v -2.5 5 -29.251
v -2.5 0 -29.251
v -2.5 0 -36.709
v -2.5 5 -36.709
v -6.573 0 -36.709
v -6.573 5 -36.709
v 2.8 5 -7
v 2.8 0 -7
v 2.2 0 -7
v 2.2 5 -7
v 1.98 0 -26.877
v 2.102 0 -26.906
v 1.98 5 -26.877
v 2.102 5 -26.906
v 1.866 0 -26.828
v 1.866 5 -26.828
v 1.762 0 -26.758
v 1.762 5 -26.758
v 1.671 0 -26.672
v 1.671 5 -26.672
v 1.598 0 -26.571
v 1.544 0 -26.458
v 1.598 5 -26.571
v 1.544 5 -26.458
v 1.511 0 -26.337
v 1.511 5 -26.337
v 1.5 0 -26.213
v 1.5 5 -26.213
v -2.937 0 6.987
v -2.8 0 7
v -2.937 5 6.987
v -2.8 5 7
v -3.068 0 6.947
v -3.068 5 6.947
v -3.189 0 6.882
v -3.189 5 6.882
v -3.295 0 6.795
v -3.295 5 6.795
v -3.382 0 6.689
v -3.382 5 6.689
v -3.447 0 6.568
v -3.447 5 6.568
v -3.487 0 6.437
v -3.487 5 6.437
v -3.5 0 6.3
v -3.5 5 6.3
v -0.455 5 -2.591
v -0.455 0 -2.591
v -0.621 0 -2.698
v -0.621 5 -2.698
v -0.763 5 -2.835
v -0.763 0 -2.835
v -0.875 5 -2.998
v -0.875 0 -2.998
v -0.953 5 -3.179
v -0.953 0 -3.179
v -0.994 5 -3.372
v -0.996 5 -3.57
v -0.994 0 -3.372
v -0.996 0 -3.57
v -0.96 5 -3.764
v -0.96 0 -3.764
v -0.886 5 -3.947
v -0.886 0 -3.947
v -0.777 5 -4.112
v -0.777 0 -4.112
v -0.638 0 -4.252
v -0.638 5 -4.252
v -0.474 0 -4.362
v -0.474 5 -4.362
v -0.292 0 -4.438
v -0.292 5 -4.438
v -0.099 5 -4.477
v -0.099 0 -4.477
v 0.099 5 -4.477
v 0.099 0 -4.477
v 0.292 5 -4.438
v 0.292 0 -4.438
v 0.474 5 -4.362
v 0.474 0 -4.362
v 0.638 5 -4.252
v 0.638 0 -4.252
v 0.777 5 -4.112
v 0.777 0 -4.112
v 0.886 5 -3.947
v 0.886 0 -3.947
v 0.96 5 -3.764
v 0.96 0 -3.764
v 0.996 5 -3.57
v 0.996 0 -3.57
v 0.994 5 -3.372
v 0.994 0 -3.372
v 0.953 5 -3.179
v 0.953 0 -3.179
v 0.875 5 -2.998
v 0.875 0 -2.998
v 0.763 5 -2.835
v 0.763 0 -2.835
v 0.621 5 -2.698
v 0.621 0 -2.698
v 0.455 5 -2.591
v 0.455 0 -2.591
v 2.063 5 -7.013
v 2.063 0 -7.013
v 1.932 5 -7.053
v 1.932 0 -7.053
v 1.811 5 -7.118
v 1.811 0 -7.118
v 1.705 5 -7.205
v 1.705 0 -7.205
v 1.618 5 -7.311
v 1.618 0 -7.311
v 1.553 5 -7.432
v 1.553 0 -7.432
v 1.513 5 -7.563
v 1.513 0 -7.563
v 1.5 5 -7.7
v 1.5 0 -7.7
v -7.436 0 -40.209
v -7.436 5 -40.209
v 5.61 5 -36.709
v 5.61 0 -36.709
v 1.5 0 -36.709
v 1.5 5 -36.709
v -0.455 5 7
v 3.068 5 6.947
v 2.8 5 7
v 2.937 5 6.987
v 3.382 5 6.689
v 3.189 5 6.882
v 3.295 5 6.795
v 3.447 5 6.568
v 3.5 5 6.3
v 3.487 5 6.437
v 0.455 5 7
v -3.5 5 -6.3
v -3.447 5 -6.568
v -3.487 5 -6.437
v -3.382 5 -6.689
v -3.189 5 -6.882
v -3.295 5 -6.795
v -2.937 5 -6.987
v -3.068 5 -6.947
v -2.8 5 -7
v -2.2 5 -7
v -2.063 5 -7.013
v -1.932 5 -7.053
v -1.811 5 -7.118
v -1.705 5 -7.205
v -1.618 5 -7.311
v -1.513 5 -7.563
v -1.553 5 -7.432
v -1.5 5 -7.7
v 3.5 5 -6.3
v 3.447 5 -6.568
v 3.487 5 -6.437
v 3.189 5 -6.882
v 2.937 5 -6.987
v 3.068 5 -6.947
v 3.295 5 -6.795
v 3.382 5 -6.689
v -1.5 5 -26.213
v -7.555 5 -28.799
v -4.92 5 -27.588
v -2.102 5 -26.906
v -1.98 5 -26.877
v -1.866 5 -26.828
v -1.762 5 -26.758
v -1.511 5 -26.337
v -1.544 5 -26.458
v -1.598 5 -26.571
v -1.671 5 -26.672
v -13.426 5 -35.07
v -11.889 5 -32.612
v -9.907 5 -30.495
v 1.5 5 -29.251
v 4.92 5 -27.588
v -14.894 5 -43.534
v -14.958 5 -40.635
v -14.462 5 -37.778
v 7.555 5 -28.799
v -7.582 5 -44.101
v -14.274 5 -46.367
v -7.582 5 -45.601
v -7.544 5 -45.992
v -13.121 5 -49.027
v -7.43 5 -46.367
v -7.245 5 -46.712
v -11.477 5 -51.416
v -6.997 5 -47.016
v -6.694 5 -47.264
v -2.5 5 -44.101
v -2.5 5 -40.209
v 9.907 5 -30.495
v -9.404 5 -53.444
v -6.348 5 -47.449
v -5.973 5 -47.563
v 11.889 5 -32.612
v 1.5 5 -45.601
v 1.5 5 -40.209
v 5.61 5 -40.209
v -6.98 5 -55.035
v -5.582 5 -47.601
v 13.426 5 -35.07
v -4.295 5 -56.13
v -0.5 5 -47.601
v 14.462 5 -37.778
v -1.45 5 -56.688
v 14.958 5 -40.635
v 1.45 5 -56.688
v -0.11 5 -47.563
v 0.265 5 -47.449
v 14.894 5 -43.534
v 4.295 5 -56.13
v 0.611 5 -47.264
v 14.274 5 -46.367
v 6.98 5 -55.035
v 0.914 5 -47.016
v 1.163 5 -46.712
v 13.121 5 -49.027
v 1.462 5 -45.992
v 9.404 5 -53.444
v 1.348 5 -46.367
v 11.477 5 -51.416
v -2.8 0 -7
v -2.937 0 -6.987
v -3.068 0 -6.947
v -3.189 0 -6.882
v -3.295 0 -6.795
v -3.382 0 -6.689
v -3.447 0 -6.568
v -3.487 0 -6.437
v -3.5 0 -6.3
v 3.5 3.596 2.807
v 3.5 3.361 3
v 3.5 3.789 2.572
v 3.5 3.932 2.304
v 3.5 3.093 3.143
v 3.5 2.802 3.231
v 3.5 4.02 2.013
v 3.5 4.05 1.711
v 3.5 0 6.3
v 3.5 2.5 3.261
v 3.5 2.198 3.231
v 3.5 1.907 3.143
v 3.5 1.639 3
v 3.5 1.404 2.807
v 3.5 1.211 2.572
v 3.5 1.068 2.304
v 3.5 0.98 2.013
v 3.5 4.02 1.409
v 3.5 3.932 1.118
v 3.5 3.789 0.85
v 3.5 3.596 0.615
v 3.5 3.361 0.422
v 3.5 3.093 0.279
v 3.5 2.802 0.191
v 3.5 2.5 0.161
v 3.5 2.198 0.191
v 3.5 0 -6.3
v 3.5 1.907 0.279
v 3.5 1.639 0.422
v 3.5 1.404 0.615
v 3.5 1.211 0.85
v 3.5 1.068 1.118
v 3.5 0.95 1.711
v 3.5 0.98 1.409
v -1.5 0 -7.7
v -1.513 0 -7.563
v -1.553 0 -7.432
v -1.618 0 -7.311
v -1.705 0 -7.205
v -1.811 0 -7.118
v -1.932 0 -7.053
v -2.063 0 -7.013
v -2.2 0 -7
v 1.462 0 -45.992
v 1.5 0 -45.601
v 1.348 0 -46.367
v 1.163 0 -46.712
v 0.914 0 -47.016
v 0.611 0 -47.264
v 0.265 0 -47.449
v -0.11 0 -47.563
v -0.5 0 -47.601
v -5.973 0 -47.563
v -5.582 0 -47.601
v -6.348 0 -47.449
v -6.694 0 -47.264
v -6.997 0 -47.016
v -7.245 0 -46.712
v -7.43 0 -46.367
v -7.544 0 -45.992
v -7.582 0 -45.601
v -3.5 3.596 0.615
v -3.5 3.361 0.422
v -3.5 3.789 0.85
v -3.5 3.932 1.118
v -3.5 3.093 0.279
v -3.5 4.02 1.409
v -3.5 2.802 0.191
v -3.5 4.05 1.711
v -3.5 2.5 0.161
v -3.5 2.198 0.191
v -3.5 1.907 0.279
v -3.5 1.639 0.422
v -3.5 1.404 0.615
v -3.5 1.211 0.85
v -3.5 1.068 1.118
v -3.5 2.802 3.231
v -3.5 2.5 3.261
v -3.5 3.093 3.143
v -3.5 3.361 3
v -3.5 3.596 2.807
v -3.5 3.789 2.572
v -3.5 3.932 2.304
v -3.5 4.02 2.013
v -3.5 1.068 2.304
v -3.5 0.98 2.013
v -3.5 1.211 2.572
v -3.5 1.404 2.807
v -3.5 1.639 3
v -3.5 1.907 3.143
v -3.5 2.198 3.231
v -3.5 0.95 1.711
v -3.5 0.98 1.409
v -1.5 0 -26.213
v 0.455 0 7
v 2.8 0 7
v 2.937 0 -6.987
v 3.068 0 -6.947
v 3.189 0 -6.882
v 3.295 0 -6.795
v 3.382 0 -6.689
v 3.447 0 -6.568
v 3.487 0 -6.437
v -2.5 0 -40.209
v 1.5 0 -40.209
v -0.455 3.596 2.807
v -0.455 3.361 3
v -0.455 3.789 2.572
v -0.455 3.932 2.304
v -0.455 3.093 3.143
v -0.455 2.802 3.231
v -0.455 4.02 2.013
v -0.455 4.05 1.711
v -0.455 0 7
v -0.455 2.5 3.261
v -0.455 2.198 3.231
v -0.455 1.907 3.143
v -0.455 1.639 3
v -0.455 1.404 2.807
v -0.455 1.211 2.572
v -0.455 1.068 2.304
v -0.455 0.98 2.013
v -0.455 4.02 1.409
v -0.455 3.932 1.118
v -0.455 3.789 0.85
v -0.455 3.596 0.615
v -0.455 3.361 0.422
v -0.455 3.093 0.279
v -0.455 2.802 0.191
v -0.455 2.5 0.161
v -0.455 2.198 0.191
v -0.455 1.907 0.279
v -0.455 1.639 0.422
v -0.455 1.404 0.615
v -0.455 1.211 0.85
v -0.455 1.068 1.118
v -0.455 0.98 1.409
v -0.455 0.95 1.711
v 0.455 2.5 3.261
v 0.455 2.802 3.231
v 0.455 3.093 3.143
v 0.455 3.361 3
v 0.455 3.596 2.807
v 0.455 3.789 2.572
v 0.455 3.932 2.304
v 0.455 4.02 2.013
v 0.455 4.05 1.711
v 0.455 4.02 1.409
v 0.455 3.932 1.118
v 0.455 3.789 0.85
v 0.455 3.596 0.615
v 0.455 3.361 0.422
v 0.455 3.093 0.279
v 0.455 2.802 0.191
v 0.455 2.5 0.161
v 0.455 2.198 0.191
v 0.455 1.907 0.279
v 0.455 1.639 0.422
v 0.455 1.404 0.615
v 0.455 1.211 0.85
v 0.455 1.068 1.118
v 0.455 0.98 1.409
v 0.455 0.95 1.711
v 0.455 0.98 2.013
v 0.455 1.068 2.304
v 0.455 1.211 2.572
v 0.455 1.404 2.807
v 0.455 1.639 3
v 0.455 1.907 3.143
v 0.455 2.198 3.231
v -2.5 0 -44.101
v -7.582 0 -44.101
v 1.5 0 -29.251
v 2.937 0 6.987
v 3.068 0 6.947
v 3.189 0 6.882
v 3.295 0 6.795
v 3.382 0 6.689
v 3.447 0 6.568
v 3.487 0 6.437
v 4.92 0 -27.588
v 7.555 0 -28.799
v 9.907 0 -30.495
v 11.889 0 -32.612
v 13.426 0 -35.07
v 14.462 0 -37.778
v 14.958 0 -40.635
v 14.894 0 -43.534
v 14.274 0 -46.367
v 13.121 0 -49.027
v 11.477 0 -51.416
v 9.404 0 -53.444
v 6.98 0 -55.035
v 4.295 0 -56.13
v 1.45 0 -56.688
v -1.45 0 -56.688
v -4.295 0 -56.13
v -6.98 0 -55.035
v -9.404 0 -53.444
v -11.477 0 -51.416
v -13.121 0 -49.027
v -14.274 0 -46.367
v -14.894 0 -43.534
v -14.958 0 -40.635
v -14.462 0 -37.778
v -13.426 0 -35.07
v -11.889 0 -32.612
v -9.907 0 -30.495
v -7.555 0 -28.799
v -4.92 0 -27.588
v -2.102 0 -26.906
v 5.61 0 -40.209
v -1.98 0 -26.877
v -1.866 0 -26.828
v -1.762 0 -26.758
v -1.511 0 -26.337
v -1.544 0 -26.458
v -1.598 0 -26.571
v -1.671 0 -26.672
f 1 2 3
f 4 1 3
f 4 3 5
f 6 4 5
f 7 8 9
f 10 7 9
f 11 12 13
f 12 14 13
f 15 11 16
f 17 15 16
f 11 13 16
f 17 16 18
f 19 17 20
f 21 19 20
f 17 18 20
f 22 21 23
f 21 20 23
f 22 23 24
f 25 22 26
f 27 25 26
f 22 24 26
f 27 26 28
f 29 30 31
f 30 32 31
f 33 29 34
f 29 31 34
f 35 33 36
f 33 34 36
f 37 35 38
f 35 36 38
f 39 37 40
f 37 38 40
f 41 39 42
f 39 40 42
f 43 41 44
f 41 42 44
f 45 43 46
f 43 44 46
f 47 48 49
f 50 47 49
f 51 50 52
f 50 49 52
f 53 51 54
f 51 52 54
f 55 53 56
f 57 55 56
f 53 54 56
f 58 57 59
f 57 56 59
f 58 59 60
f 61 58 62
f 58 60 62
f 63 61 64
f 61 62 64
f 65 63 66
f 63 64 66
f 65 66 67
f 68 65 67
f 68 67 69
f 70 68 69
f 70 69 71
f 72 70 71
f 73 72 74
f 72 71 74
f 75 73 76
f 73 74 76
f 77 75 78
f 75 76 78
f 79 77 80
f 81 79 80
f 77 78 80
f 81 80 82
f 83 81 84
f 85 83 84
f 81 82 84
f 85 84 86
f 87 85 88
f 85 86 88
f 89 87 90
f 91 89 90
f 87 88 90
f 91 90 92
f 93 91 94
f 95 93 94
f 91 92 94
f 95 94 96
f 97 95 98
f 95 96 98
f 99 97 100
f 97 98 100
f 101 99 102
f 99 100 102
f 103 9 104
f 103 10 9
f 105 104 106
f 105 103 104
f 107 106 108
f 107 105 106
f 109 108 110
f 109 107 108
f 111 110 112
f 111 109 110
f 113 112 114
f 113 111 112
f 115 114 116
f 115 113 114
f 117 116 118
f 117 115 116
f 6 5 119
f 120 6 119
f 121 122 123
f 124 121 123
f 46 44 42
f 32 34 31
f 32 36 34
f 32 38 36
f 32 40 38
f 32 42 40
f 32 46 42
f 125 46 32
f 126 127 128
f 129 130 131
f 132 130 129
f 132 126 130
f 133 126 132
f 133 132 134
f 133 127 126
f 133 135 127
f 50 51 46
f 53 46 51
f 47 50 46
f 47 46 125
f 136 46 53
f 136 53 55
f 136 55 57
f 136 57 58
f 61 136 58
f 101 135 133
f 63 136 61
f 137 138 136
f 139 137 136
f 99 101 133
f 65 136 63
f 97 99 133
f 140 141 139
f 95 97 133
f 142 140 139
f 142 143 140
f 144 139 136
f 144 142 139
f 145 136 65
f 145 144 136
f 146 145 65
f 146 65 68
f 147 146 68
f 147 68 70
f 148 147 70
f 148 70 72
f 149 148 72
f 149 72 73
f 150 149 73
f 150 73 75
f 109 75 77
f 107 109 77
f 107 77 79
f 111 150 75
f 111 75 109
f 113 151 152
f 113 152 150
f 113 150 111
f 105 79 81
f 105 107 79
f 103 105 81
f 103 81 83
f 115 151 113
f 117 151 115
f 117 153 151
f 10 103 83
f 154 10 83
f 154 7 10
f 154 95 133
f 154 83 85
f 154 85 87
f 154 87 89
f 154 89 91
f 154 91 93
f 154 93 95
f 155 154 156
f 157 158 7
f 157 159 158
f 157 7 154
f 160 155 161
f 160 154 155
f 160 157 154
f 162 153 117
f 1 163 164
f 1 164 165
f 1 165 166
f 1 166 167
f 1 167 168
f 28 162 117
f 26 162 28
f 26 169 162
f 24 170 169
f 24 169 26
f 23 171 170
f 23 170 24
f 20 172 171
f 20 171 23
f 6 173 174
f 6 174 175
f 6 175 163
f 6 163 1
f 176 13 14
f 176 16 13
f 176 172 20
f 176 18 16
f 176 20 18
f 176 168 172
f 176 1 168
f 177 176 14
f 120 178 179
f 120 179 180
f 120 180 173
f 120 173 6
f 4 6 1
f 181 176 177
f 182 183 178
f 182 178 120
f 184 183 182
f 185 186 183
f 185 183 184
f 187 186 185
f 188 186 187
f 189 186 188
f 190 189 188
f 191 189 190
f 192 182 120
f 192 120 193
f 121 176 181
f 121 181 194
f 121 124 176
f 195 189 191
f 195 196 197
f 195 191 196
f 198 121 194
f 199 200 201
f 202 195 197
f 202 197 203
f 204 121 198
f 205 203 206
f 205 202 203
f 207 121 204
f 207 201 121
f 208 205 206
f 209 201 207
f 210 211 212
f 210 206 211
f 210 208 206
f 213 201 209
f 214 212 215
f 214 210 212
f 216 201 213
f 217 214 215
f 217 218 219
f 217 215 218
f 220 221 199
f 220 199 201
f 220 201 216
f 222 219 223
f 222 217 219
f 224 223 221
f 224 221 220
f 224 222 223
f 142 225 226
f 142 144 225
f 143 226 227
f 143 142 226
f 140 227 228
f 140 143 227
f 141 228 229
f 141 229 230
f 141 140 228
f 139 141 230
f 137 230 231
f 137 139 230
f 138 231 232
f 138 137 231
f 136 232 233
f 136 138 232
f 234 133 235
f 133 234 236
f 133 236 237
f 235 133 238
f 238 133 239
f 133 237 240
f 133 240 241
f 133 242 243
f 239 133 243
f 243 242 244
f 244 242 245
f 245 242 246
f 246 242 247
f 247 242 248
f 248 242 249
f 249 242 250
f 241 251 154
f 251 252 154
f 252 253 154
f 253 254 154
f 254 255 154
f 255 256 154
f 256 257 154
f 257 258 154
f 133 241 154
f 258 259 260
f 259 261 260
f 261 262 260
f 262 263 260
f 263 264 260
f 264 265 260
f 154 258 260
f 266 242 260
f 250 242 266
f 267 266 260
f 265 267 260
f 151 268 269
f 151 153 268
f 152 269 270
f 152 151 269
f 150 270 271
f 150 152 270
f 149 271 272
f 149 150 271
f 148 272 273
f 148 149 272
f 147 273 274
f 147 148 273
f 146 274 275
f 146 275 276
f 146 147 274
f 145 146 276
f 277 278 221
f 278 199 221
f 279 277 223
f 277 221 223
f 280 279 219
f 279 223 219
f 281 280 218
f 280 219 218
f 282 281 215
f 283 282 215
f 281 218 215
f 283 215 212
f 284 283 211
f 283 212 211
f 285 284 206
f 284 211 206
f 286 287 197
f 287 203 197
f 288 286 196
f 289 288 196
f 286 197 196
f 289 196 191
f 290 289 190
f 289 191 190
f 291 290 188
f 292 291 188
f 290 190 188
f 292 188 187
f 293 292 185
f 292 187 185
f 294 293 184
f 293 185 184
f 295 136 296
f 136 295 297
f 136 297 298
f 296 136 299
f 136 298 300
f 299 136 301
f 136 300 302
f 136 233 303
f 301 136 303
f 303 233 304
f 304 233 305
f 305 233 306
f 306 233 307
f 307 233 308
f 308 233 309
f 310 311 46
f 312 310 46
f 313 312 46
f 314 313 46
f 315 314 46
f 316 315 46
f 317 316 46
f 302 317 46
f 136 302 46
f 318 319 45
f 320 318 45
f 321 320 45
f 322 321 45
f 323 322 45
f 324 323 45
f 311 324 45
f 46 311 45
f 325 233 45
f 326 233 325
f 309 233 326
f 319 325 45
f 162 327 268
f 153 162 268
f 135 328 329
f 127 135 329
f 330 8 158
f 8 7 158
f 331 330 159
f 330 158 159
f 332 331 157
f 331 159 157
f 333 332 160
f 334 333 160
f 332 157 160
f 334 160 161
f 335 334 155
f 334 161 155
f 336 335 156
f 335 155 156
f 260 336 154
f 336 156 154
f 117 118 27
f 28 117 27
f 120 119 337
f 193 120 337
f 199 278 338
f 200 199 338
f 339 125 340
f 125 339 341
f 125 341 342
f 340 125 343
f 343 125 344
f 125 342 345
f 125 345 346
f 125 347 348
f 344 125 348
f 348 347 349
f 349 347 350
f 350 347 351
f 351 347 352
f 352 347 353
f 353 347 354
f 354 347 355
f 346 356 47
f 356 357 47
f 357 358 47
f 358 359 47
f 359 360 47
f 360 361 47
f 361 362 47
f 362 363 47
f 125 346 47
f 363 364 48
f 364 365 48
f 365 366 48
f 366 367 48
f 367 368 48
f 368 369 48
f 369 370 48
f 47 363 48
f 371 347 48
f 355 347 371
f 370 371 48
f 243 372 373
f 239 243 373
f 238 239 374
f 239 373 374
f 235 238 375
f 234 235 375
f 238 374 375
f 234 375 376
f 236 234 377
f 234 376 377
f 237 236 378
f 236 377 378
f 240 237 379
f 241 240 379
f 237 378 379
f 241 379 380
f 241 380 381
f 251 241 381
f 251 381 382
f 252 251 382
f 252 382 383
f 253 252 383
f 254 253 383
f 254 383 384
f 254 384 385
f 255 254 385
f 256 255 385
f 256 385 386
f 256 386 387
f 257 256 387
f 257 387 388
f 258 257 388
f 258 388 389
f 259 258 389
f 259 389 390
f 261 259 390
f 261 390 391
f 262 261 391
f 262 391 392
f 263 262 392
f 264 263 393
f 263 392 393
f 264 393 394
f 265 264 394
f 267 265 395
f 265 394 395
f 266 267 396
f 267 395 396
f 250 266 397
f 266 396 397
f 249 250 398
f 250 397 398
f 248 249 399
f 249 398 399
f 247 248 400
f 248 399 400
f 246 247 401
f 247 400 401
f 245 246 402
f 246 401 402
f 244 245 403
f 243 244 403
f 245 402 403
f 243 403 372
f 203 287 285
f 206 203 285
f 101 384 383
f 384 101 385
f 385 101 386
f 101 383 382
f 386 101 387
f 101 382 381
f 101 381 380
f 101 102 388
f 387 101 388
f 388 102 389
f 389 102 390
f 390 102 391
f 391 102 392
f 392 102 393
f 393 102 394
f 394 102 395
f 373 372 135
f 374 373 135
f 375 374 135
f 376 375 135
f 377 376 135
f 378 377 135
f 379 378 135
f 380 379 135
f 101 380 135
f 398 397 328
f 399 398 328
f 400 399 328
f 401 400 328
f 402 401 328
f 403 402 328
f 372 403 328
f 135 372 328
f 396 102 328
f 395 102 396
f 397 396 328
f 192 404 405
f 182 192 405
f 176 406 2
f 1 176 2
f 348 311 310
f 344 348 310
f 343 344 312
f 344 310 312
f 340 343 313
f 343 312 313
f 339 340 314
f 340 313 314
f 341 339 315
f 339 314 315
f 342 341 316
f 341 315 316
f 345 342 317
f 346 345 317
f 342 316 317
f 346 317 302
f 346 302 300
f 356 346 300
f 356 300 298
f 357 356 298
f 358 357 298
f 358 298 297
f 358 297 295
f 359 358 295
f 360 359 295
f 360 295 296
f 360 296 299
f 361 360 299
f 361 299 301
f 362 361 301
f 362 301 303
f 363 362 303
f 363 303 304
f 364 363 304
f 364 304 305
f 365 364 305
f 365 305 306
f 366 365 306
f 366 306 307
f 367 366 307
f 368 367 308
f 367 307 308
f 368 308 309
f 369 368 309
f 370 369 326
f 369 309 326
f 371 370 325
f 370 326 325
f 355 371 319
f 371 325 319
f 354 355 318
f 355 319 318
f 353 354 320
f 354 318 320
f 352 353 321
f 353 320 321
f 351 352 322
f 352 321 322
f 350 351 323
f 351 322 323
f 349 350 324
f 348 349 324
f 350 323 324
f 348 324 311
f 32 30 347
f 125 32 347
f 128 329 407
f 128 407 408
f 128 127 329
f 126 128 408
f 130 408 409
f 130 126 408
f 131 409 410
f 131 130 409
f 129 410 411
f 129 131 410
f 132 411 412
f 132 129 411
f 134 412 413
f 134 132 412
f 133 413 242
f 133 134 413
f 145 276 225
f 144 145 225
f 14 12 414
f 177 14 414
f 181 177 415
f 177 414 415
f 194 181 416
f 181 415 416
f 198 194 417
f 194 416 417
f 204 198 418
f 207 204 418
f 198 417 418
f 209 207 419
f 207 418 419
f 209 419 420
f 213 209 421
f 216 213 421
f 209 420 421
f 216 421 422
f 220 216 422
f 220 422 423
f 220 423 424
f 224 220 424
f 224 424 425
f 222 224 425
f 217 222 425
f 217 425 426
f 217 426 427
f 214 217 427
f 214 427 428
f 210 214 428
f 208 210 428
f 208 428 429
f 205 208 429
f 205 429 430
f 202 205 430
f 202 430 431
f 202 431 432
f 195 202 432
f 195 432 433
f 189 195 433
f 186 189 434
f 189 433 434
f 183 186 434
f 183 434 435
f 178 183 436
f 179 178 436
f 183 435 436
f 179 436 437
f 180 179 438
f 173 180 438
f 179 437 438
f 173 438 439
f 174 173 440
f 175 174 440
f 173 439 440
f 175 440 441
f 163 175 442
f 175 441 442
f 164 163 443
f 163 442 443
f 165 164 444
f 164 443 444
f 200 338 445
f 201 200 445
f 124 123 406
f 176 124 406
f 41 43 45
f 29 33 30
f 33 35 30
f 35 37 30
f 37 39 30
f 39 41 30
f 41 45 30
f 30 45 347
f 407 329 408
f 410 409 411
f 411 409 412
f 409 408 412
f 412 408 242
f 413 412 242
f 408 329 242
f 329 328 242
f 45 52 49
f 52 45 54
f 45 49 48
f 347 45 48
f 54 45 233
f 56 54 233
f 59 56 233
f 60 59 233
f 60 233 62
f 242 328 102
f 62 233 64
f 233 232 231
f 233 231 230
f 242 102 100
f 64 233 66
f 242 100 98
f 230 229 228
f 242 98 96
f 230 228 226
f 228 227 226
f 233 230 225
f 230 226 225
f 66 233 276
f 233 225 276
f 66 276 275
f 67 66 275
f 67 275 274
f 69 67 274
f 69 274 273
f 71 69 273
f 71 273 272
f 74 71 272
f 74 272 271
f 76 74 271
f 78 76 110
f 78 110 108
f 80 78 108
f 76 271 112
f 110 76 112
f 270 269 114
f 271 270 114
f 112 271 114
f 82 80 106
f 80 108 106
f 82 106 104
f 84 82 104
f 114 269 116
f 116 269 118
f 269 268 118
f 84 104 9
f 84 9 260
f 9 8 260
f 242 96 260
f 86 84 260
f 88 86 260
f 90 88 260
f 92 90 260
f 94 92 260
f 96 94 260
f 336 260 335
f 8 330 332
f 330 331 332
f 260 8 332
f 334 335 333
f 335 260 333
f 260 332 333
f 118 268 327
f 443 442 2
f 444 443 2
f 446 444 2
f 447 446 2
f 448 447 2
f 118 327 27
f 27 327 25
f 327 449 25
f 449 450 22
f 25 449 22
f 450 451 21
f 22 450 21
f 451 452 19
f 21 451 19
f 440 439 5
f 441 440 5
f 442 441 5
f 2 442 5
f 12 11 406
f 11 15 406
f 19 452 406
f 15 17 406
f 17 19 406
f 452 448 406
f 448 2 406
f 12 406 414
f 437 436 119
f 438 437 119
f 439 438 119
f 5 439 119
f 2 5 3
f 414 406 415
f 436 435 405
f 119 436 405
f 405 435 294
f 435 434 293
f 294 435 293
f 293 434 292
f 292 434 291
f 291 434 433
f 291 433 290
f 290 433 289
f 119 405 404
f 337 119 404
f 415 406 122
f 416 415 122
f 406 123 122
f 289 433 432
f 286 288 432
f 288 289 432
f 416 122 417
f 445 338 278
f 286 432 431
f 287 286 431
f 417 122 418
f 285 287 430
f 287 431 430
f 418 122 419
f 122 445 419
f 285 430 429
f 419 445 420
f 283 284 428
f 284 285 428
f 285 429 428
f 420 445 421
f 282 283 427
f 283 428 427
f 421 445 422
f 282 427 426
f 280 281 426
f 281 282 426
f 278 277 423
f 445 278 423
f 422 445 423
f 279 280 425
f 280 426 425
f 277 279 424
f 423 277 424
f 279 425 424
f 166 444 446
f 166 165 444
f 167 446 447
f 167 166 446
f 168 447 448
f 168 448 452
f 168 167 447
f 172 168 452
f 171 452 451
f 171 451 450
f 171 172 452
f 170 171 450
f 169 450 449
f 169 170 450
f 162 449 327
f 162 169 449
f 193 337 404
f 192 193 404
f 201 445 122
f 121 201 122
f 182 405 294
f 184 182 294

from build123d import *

# Parameters (mm, degrees)
BOSS_EXTRUDE2_DEPTH = 5
SKETCH5_R           = 1.55
CUT_EXTRUDE1_DEPTH  = 60.905859109
FILLET6_R           = 0.7
FILLET7_R           = 0.7
FILLET8_R           = 0.7
FILLET9_R           = 0.7
FILLET10_R          = 0.7
FILLET11_R          = 0.7
FILLET12_R          = 0.7
FILLET13_R          = 0.7
FILLET14_R          = 2
FILLET15_R          = 2


with BuildPart() as part:
    # Sketch3 → Boss-Extrude2 (new body)
    with BuildSketch(Plane(origin=(0, 0, 0), x_dir=(1, 0, 0), z_dir=(0, 1, 0))):
        with BuildLine():
            Line((0.454624582, 2.591384664), (0.454624582, -7))
            Line((0.454624582, -7), (3.5, -7))
            Line((3.5, -7), (3.5, 7))
            Line((3.5, 7), (1.5, 7))
            Line((1.5, 7), (1.5, 26.833112609))
            ThreePointArc((1.5, 26.833112609), (0, 56.757924165), (-1.5, 26.833112609))
            Line((-1.5, 26.833112609), (-1.5, 7))
            Line((-1.5, 7), (-3.5, 7))
            Line((-3.5, 7), (-3.5, -7))
            Line((-3.5, -7), (-0.454624582, -7))
            Line((-0.454624582, -7), (-0.454624582, 2.591384664))
            ThreePointArc((-0.454624582, 2.591384664), (0, 4.482067823), (0.454624582, 2.591384664))
        make_face()
        Polygon((1.5, 36.708863036), (1.5, 29.251163785), (-2.5, 29.251163785), (-2.5, 36.708863036), (-6.573288639, 36.708863036), (-7.435532145, 40.208863036), (-2.5, 40.208863036), (-2.5, 44.101325286), (-7.582366619, 44.101325286), (-7.582366619, 47.601325286), (1.5, 47.601325286), (1.5, 40.208863036), (5.609756824, 40.208863036), (5.609756824, 36.708863036), align=None, mode=Mode.SUBTRACT)
    extrude(amount=BOSS_EXTRUDE2_DEPTH)

    # Sketch5 → Cut-Extrude1 (cut, through all)
    with BuildSketch(Plane.ZY.offset(3.5)):
        with Locations((1.710892138, 2.5)):
            Circle(SKETCH5_R)
    extrude(amount=-CUT_EXTRUDE1_DEPTH, mode=Mode.SUBTRACT)

    # Fillet6
    fillet6_edges = [part.edges().sort_by_distance(p)[0] for p in [
        (1.5, 2.5, -7),
    ]]
    fillet(fillet6_edges, radius=FILLET6_R)

    # Fillet7
    fillet7_edges = [part.edges().sort_by_distance(p)[0] for p in [
        (3.5, 2.5, -7),
    ]]
    fillet(fillet7_edges, radius=FILLET7_R)

    # Fillet8
    fillet8_edges = [part.edges().sort_by_distance(p)[0] for p in [
        (-1.5, 2.5, -7),
    ]]
    fillet(fillet8_edges, radius=FILLET8_R)

    # Fillet9
    fillet9_edges = [part.edges().sort_by_distance(p)[0] for p in [
        (-3.5, 2.5, -7),
    ]]
    fillet(fillet9_edges, radius=FILLET9_R)

    # Fillet10
    fillet10_edges = [part.edges().sort_by_distance(p)[0] for p in [
        (3.5, 2.5, 7),
    ]]
    fillet(fillet10_edges, radius=FILLET10_R)

    # Fillet11
    fillet11_edges = [part.edges().sort_by_distance(p)[0] for p in [
        (-3.5, 2.5, 7),
    ]]
    fillet(fillet11_edges, radius=FILLET11_R)

    # Fillet12
    fillet12_edges = [part.edges().sort_by_distance(p)[0] for p in [
        (1.5, 2.5, -26.833112609),
    ]]
    fillet(fillet12_edges, radius=FILLET12_R)

    # Fillet13
    fillet13_edges = [part.edges().sort_by_distance(p)[0] for p in [
        (-1.5, 2.5, -26.833112609),
    ]]
    fillet(fillet13_edges, radius=FILLET13_R)

    # Fillet14
    fillet14_edges = [part.edges().sort_by_distance(p)[0] for p in [
        (1.5, 2.5, -47.601325286),
    ]]
    fillet(fillet14_edges, radius=FILLET14_R)

    # Fillet15
    fillet15_edges = [part.edges().sort_by_distance(p)[0] for p in [
        (-7.582366619, 2.5, -47.601325286),
    ]]
    fillet(fillet15_edges, radius=FILLET15_R)


solid = part.part
